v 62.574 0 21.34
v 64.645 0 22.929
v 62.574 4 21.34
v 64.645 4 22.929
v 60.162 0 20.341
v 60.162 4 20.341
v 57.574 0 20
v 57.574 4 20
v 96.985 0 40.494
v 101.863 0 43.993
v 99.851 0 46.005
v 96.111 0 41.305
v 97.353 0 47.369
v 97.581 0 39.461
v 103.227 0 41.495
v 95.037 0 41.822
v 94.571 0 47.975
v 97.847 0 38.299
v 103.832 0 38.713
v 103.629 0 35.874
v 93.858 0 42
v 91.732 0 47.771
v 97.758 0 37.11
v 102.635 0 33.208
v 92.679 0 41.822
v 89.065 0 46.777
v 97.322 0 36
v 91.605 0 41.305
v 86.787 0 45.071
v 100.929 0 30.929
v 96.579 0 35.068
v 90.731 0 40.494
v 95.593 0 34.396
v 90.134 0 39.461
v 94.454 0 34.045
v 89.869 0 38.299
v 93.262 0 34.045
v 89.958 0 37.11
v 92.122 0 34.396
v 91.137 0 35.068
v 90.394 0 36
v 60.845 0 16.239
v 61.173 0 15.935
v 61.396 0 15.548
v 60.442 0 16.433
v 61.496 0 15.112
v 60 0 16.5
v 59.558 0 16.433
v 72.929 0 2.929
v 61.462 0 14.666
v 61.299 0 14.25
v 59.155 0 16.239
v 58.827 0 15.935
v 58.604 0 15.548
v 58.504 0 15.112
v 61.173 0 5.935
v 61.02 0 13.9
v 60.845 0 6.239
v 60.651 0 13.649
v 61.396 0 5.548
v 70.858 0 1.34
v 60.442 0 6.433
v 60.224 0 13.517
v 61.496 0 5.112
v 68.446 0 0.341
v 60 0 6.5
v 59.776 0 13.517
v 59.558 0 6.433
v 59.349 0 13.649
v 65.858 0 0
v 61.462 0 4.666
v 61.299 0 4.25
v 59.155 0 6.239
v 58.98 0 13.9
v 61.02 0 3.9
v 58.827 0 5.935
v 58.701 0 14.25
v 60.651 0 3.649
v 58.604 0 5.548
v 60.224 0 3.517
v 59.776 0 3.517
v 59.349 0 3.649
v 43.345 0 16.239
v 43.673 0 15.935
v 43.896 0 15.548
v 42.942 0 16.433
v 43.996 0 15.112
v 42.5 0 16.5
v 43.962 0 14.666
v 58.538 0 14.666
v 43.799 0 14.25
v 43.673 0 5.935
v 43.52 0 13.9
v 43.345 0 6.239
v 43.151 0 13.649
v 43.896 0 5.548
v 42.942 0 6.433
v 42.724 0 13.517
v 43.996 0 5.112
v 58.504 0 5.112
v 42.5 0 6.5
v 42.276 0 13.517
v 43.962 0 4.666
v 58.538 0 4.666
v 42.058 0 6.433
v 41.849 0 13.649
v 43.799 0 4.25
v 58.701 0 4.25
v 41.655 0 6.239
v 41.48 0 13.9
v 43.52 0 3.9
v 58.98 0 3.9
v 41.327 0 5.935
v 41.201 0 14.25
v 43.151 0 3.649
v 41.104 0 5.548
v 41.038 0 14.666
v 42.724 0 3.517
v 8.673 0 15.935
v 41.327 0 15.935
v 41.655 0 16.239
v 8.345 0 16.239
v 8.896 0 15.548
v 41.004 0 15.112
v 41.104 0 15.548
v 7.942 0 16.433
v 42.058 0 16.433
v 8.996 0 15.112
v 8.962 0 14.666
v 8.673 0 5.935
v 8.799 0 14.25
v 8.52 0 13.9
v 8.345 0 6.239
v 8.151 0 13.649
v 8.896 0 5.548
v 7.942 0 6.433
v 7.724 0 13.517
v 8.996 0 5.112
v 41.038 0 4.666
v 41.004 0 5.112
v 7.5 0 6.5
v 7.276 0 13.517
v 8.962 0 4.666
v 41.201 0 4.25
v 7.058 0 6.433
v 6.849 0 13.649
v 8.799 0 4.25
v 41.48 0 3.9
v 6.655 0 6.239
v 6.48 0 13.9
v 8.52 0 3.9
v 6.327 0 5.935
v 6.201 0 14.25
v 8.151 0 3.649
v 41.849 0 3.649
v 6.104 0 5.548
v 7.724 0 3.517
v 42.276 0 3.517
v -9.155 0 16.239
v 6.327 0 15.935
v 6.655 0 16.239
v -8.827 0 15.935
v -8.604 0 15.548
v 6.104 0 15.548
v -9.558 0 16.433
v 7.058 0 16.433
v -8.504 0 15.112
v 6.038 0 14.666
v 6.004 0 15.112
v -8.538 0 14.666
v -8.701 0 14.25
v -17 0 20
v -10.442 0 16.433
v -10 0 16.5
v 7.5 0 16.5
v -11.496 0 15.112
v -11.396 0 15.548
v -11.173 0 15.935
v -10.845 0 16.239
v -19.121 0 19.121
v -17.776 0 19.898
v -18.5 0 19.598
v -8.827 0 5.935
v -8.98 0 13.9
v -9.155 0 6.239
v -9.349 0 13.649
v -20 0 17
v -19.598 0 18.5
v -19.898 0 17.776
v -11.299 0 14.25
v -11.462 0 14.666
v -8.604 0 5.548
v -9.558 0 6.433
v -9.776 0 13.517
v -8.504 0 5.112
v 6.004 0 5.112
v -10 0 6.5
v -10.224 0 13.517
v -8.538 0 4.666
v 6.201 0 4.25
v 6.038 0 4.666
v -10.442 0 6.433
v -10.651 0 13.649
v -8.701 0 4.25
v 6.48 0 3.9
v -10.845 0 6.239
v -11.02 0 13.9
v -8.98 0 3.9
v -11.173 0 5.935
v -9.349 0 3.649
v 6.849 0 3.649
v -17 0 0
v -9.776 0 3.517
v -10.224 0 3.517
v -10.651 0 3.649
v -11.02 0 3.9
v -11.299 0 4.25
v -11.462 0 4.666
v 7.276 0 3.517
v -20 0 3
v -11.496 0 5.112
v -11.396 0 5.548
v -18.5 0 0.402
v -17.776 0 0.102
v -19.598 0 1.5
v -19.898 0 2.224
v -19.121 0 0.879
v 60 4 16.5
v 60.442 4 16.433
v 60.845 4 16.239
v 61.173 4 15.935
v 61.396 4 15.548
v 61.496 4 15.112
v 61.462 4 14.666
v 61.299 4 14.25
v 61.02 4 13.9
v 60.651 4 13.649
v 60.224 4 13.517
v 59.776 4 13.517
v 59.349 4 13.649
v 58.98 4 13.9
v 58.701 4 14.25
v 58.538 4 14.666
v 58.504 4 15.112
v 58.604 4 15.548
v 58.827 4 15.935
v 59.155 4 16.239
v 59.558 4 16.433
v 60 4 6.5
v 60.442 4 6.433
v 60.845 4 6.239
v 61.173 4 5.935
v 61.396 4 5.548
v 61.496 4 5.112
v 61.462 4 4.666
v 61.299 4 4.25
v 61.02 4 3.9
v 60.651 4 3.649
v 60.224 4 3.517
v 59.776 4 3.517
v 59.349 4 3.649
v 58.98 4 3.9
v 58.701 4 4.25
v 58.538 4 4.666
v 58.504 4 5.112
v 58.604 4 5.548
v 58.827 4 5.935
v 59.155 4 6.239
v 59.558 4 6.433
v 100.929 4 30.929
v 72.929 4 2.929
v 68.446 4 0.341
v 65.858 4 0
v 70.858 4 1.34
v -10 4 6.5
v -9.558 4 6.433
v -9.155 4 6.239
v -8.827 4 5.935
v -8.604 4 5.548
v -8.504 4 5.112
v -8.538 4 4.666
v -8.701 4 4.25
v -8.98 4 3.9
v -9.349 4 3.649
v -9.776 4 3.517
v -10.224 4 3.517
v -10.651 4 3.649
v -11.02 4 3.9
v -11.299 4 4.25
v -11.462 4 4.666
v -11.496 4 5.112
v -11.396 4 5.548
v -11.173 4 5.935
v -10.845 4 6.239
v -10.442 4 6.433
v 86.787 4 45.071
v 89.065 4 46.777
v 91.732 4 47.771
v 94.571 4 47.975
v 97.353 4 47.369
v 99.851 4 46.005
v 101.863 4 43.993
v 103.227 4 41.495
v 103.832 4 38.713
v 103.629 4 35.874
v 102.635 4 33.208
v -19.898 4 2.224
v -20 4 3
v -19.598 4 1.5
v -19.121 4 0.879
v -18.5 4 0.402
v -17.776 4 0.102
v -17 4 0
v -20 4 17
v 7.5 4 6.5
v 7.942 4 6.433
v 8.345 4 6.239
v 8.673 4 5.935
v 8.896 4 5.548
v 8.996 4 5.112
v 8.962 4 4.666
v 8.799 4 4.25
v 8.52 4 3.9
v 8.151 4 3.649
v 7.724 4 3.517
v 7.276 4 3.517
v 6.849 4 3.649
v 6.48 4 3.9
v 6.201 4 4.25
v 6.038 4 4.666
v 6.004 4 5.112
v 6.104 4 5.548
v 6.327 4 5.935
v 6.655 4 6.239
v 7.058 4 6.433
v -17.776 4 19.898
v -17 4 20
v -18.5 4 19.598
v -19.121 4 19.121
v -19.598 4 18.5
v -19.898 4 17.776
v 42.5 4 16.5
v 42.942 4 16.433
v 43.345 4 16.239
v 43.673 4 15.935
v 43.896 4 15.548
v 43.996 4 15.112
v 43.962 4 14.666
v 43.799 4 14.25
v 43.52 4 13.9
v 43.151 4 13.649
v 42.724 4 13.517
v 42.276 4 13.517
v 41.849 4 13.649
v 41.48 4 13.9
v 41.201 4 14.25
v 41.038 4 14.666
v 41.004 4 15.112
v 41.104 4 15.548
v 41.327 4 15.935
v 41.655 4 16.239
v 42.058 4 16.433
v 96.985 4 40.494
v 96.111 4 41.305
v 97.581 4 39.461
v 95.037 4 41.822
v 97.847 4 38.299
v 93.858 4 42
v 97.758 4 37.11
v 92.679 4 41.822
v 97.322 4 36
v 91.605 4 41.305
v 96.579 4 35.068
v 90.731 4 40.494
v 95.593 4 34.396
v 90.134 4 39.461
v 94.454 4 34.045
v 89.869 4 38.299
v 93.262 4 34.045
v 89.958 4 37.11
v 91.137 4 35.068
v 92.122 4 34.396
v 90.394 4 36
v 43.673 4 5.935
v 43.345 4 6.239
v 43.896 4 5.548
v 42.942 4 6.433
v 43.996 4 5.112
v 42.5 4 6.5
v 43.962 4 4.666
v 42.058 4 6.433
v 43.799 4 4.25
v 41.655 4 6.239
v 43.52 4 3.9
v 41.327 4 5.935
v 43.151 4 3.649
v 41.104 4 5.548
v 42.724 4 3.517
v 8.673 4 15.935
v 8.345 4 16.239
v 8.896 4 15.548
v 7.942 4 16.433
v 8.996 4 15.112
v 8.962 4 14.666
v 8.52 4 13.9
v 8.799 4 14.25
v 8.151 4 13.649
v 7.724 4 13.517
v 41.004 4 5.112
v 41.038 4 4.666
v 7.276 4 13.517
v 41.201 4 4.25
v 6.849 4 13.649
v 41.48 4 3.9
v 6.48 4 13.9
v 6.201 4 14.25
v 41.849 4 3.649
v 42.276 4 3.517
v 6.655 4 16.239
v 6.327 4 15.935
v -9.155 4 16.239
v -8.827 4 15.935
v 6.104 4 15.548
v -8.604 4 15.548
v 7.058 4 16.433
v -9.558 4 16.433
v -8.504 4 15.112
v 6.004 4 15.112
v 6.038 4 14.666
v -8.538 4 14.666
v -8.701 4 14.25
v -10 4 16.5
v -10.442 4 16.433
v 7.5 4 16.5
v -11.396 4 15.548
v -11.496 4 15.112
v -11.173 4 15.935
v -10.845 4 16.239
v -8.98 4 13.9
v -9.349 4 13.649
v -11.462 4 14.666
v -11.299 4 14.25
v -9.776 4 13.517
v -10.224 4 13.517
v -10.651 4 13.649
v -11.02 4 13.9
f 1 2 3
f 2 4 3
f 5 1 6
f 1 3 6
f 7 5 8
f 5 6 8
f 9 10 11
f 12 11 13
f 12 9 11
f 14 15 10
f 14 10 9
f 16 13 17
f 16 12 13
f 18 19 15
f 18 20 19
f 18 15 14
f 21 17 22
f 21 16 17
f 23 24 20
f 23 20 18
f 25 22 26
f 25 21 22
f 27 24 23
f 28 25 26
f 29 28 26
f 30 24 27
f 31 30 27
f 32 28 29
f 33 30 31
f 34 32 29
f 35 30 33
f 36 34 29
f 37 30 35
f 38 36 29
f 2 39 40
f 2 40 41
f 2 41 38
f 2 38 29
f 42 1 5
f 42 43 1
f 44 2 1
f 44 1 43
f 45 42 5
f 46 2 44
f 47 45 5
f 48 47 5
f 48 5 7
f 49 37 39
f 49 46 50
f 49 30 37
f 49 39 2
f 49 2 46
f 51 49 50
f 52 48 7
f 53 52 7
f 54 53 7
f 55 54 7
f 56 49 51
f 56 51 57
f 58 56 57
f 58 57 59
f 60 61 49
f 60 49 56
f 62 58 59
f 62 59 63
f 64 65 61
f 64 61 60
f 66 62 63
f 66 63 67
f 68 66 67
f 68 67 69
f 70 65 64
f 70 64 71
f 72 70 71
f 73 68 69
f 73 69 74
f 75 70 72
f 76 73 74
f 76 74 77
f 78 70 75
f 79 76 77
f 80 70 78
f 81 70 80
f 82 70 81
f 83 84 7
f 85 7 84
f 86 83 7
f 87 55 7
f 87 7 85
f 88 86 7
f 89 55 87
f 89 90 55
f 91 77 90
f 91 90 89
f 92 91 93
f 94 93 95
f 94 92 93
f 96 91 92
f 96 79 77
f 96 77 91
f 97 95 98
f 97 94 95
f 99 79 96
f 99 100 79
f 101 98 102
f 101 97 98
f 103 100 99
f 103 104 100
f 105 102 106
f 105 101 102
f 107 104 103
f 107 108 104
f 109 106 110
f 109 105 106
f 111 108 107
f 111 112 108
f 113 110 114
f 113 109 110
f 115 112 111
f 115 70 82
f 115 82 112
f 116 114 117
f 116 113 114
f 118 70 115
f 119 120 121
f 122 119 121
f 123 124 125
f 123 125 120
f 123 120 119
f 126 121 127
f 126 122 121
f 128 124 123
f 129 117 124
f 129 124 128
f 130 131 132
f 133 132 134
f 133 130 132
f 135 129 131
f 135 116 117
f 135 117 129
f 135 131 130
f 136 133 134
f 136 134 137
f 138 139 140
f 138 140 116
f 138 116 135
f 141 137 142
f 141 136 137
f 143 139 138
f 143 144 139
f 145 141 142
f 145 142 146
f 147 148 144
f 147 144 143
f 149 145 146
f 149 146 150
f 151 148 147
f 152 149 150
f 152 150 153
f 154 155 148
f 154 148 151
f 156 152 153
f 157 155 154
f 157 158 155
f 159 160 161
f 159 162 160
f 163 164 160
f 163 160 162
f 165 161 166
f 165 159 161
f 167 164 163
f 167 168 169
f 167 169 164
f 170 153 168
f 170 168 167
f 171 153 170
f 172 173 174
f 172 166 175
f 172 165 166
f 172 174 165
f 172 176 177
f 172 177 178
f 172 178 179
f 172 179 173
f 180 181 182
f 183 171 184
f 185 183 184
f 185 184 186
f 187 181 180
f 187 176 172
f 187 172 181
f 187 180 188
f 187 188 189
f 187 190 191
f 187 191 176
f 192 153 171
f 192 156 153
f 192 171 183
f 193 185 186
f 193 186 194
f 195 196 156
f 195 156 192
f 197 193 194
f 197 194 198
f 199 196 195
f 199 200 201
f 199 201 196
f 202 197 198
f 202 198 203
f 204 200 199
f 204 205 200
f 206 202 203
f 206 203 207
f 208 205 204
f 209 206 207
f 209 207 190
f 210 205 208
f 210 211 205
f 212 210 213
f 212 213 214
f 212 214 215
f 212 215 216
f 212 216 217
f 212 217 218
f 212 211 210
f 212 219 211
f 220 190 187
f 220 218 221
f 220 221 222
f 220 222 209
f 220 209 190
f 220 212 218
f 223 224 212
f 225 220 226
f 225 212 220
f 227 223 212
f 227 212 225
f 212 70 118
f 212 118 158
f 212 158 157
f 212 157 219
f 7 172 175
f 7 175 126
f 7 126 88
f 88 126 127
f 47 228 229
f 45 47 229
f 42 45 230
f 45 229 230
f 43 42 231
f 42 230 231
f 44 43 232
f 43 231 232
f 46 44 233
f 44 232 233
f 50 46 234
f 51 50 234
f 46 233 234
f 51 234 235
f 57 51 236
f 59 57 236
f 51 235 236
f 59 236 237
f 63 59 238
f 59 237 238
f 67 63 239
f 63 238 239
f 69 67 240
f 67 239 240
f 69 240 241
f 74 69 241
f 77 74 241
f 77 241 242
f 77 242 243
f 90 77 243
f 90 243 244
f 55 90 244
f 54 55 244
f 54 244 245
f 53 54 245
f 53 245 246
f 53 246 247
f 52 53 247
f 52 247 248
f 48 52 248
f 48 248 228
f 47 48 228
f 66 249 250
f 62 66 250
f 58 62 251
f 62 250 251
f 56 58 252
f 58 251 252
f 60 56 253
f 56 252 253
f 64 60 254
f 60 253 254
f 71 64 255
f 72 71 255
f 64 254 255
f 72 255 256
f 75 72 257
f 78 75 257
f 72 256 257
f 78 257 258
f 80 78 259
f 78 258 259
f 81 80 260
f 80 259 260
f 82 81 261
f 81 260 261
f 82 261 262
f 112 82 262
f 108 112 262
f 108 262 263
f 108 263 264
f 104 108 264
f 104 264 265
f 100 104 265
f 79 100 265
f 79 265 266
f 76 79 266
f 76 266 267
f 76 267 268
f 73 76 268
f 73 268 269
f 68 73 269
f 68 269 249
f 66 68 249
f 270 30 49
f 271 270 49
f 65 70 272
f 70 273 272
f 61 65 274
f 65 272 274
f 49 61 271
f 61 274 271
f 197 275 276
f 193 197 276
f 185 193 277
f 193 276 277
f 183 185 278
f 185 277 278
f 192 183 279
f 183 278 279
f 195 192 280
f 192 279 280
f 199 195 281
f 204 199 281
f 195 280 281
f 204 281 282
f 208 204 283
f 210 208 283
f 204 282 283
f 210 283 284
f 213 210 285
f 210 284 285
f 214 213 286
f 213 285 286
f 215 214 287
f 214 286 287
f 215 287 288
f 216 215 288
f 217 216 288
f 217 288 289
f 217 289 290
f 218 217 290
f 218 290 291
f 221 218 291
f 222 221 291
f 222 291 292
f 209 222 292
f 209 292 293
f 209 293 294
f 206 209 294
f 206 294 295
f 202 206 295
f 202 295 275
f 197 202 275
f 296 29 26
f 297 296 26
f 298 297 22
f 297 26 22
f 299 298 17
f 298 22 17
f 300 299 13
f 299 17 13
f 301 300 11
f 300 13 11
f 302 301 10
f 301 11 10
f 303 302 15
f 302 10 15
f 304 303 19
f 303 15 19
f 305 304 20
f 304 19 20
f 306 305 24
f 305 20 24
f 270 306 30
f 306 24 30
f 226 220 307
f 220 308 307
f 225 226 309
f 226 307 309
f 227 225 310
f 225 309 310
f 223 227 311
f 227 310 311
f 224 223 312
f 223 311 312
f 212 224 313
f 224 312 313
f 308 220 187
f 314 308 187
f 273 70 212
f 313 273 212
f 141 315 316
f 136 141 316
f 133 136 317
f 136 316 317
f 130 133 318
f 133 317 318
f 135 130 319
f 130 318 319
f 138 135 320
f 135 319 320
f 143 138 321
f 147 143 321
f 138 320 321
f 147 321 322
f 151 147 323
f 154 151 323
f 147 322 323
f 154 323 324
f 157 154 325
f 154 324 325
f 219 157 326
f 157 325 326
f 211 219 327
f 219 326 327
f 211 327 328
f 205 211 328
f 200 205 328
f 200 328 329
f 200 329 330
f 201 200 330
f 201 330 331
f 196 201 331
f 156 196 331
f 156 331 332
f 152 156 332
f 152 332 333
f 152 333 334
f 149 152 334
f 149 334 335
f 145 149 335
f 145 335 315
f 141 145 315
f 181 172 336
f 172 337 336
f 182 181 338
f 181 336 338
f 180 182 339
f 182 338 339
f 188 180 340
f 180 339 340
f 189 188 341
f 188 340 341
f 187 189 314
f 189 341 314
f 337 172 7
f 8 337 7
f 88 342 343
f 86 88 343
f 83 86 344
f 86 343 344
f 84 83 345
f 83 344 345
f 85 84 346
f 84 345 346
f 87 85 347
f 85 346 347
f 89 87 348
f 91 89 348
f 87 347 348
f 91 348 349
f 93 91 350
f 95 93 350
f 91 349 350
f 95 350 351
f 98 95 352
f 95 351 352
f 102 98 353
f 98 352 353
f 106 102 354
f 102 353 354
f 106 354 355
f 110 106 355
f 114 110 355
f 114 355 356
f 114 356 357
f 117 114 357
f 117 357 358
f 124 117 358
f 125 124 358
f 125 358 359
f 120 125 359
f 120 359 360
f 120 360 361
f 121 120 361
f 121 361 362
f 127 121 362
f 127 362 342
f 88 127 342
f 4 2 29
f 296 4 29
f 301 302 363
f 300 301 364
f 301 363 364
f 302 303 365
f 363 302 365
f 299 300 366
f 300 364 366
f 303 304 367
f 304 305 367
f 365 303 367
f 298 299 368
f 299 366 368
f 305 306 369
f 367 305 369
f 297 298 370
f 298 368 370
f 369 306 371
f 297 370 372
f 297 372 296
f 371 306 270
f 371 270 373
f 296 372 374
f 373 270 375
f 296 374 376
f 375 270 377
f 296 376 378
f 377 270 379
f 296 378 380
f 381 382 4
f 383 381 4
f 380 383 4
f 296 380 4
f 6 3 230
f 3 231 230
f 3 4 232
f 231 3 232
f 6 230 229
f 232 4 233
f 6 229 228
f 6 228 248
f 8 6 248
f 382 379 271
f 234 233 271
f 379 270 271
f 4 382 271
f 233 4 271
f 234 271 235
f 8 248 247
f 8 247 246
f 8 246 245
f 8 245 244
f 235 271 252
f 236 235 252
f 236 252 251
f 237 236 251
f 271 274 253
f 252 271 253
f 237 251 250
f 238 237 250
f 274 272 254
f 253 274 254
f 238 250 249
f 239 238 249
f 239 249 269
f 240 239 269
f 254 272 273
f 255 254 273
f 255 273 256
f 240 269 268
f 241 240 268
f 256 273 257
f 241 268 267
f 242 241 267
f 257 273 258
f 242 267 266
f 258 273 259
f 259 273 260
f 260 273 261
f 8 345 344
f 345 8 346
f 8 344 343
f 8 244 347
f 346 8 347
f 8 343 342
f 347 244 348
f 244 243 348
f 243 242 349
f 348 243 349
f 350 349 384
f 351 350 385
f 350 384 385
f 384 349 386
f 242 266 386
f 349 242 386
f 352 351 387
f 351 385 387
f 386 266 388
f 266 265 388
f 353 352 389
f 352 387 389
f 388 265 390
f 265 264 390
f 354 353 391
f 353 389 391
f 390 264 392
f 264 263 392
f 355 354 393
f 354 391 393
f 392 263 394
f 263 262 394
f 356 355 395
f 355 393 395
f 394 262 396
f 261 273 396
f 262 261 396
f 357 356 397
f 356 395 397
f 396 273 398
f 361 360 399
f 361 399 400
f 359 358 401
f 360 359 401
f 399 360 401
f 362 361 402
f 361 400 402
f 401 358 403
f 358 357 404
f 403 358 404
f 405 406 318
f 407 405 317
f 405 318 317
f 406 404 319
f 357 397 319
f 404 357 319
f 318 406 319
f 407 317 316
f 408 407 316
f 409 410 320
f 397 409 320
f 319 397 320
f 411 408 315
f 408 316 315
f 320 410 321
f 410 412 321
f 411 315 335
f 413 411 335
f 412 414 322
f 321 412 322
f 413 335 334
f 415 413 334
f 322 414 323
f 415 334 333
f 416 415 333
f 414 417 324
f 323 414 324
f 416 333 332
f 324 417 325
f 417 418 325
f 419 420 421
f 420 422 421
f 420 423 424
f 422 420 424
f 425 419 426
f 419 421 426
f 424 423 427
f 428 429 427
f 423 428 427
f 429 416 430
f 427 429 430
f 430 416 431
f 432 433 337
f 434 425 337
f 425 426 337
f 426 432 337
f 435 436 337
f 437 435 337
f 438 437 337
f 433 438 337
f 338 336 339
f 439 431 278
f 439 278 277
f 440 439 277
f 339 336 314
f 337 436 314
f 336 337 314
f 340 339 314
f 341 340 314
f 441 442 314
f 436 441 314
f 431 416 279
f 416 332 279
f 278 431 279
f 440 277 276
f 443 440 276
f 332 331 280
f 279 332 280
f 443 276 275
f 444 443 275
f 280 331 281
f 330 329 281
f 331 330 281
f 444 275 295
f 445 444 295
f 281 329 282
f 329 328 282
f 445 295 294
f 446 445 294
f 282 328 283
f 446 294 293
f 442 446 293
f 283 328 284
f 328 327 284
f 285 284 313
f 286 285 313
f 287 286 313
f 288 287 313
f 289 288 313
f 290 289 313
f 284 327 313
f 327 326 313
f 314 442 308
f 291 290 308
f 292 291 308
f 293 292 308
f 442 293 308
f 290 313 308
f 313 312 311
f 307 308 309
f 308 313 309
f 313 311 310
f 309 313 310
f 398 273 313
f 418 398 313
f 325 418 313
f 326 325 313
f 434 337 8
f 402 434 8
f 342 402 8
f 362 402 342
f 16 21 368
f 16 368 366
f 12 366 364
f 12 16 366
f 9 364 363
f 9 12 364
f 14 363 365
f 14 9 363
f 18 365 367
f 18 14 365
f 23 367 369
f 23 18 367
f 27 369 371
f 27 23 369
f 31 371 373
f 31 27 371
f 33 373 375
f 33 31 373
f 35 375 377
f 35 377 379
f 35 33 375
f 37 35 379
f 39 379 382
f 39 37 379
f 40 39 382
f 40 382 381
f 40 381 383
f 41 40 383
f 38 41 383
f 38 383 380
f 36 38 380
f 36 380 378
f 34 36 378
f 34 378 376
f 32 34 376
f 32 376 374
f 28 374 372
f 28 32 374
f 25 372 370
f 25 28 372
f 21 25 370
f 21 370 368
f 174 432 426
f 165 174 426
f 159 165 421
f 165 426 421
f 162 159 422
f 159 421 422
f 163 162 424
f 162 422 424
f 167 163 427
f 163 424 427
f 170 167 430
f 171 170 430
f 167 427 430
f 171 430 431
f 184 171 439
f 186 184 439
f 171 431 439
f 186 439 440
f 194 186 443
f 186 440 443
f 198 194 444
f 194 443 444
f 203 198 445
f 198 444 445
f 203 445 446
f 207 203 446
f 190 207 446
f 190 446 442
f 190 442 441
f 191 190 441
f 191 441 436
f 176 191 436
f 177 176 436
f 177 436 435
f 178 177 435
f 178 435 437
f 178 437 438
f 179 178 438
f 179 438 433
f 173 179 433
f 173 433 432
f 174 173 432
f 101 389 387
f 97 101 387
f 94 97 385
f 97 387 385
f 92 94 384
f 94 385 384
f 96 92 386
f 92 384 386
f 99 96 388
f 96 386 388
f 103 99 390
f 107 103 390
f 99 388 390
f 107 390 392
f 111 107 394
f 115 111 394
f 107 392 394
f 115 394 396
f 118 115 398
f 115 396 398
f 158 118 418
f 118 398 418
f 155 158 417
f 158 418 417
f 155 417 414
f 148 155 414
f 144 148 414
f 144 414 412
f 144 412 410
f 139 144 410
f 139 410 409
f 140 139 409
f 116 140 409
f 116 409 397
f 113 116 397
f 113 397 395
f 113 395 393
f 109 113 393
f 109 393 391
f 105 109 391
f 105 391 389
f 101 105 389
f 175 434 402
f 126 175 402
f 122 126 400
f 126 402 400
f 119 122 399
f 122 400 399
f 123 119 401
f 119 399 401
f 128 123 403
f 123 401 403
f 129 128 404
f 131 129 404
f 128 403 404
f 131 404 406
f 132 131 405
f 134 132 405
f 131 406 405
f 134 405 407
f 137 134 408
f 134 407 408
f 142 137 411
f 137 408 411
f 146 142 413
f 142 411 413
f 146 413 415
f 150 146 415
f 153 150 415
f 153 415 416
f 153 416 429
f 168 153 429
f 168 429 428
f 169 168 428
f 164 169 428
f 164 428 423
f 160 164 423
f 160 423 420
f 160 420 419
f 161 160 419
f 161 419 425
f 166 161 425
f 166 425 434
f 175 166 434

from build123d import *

# Parameters (mm, degrees)
SKETCH_1_R          = 4
EXTRUDE_1_DEPTH     = 4
CUT_EXTRUDE_1_REACH = 127.309
SKETCH_2_R          = 1.5
EXTRUDE_2_DEPTH     = 4
FILLET_1_R          = 3
FILLET_3_R          = 10
SKETCH_4_R          = 1.5
CUT_EXTRUDE_2_DEPTH = 10


with BuildPart() as part:
    # 草图1 → 凸台-拉伸1 (new body)
    with BuildSketch(Plane(origin=(0, 0, 0), x_dir=(1, 0, 0), z_dir=(0, 1, 0))):
        with BuildLine():
            Line((100.928932188, -30.928932188), (70, 0))
            Line((70, 0), (35, 0))
            Line((35, 0), (35, 70))
            Line((35, 70), (15, 70))
            Line((15, 70), (15, 0))
            Line((15, 0), (-20, 0))
            Line((-20, 0), (-20, -20))
            Line((-20, -20), (61.715728753, -20))
            Line((61.715728753, -20), (86.786796564, -45.071067812))
            ThreePointArc((86.786796564, -45.071067812), (100.928932188, -45.071067812), (100.928932188, -30.928932188))
        make_face()
        with Locations(Location((93.857864376, -38, 0), (0, 0, 270))):
            Circle(SKETCH_1_R, mode=Mode.SUBTRACT)
    extrude(amount=EXTRUDE_1_DEPTH)

    # 草图2 → 切除-拉伸1 (cut, up to next)
    with BuildSketch(Plane(origin=(0, 4, 0), x_dir=(1, 0, 0), z_dir=(0, 1, 0)), mode=Mode.PRIVATE) as cut_extrude_1_sk1:
        with Locations(Location((17.5, 60, 0), (0, 0, 270))):
            Circle(SKETCH_2_R)
    cut_extrude_1_tool1 = extrude(cut_extrude_1_sk1.sketch, amount=-CUT_EXTRUDE_1_REACH, mode=Mode.PRIVATE) & part.part
    # 草图2 → 切除-拉伸1 (cut, up to next)
    with BuildSketch(Plane(origin=(0, 4, 0), x_dir=(1, 0, 0), z_dir=(0, 1, 0)), mode=Mode.PRIVATE) as cut_extrude_1_sk2:
        with Locations(Location((32.5, 60, 0), (0, 0, 270))):
            Circle(SKETCH_2_R)
    cut_extrude_1_tool2 = extrude(cut_extrude_1_sk2.sketch, amount=-CUT_EXTRUDE_1_REACH, mode=Mode.PRIVATE) & part.part
    # 草图2 → 切除-拉伸1 (cut, up to next)
    with BuildSketch(Plane(origin=(0, 4, 0), x_dir=(1, 0, 0), z_dir=(0, 1, 0)), mode=Mode.PRIVATE) as cut_extrude_1_sk3:
        with Locations(Location((32.5, 50, 0), (0, 0, 270))):
            Circle(SKETCH_2_R)
    cut_extrude_1_tool3 = extrude(cut_extrude_1_sk3.sketch, amount=-CUT_EXTRUDE_1_REACH, mode=Mode.PRIVATE) & part.part
    # 草图2 → 切除-拉伸1 (cut, up to next)
    with BuildSketch(Plane(origin=(0, 4, 0), x_dir=(1, 0, 0), z_dir=(0, 1, 0)), mode=Mode.PRIVATE) as cut_extrude_1_sk4:
        with Locations(Location((17.5, 50, 0), (0, 0, 270))):
            Circle(SKETCH_2_R)
    cut_extrude_1_tool4 = extrude(cut_extrude_1_sk4.sketch, amount=-CUT_EXTRUDE_1_REACH, mode=Mode.PRIVATE) & part.part
    # 草图2 → 切除-拉伸1 (cut, up to next)
    with BuildSketch(Plane(origin=(0, 4, 0), x_dir=(1, 0, 0), z_dir=(0, 1, 0)), mode=Mode.PRIVATE) as cut_extrude_1_sk5:
        with Locations(Location((17.5, 20, 0), (0, 0, 270))):
            Circle(SKETCH_2_R)
    cut_extrude_1_tool5 = extrude(cut_extrude_1_sk5.sketch, amount=-CUT_EXTRUDE_1_REACH, mode=Mode.PRIVATE) & part.part
    # 草图2 → 切除-拉伸1 (cut, up to next)
    with BuildSketch(Plane(origin=(0, 4, 0), x_dir=(1, 0, 0), z_dir=(0, 1, 0)), mode=Mode.PRIVATE) as cut_extrude_1_sk6:
        with Locations(Location((17.5, 10, 0), (0, 0, 270))):
            Circle(SKETCH_2_R)
    cut_extrude_1_tool6 = extrude(cut_extrude_1_sk6.sketch, amount=-CUT_EXTRUDE_1_REACH, mode=Mode.PRIVATE) & part.part
    # 草图2 → 切除-拉伸1 (cut, up to next)
    with BuildSketch(Plane(origin=(0, 4, 0), x_dir=(1, 0, 0), z_dir=(0, 1, 0)), mode=Mode.PRIVATE) as cut_extrude_1_sk7:
        with Locations(Location((32.5, 10, 0), (0, 0, 270))):
            Circle(SKETCH_2_R)
    cut_extrude_1_tool7 = extrude(cut_extrude_1_sk7.sketch, amount=-CUT_EXTRUDE_1_REACH, mode=Mode.PRIVATE) & part.part
    # 草图2 → 切除-拉伸1 (cut, up to next)
    with BuildSketch(Plane(origin=(0, 4, 0), x_dir=(1, 0, 0), z_dir=(0, 1, 0)), mode=Mode.PRIVATE) as cut_extrude_1_sk8:
        with Locations(Location((32.5, 20, 0), (0, 0, 270))):
            Circle(SKETCH_2_R)
    cut_extrude_1_tool8 = extrude(cut_extrude_1_sk8.sketch, amount=-CUT_EXTRUDE_1_REACH, mode=Mode.PRIVATE) & part.part
    # 草图2 → 切除-拉伸1 (cut, up to next)
    with BuildSketch(Plane(origin=(0, 4, 0), x_dir=(1, 0, 0), z_dir=(0, 1, 0)), mode=Mode.PRIVATE) as cut_extrude_1_sk9:
        with Locations(Location((42.5, -5, 0), (0, 0, 270))):
            Circle(SKETCH_2_R)
    cut_extrude_1_tool9 = extrude(cut_extrude_1_sk9.sketch, amount=-CUT_EXTRUDE_1_REACH, mode=Mode.PRIVATE) & part.part
    # 草图2 → 切除-拉伸1 (cut, up to next)
    with BuildSketch(Plane(origin=(0, 4, 0), x_dir=(1, 0, 0), z_dir=(0, 1, 0)), mode=Mode.PRIVATE) as cut_extrude_1_sk10:
        with Locations(Location((42.5, -15, 0), (0, 0, 270))):
            Circle(SKETCH_2_R)
    cut_extrude_1_tool10 = extrude(cut_extrude_1_sk10.sketch, amount=-CUT_EXTRUDE_1_REACH, mode=Mode.PRIVATE) & part.part
    # 草图2 → 切除-拉伸1 (cut, up to next)
    with BuildSketch(Plane(origin=(0, 4, 0), x_dir=(1, 0, 0), z_dir=(0, 1, 0)), mode=Mode.PRIVATE) as cut_extrude_1_sk11:
        with Locations(Location((7.5, -15, 0), (0, 0, 270))):
            Circle(SKETCH_2_R)
    cut_extrude_1_tool11 = extrude(cut_extrude_1_sk11.sketch, amount=-CUT_EXTRUDE_1_REACH, mode=Mode.PRIVATE) & part.part
    # 草图2 → 切除-拉伸1 (cut, up to next)
    with BuildSketch(Plane(origin=(0, 4, 0), x_dir=(1, 0, 0), z_dir=(0, 1, 0)), mode=Mode.PRIVATE) as cut_extrude_1_sk12:
        with Locations(Location((7.5, -5, 0), (0, 0, 270))):
            Circle(SKETCH_2_R)
    cut_extrude_1_tool12 = extrude(cut_extrude_1_sk12.sketch, amount=-CUT_EXTRUDE_1_REACH, mode=Mode.PRIVATE) & part.part
    # 草图2 → 切除-拉伸1 (cut, up to next)
    with BuildSketch(Plane(origin=(0, 4, 0), x_dir=(1, 0, 0), z_dir=(0, 1, 0)), mode=Mode.PRIVATE) as cut_extrude_1_sk13:
        with Locations(Location((60, -15, 0), (0, 0, 270))):
            Circle(SKETCH_2_R)
    cut_extrude_1_tool13 = extrude(cut_extrude_1_sk13.sketch, amount=-CUT_EXTRUDE_1_REACH, mode=Mode.PRIVATE) & part.part
    # 草图2 → 切除-拉伸1 (cut, up to next)
    with BuildSketch(Plane(origin=(0, 4, 0), x_dir=(1, 0, 0), z_dir=(0, 1, 0)), mode=Mode.PRIVATE) as cut_extrude_1_sk14:
        with Locations(Location((60, -5, 0), (0, 0, 270))):
            Circle(SKETCH_2_R)
    cut_extrude_1_tool14 = extrude(cut_extrude_1_sk14.sketch, amount=-CUT_EXTRUDE_1_REACH, mode=Mode.PRIVATE) & part.part
    # 草图2 → 切除-拉伸1 (cut, up to next)
    with BuildSketch(Plane(origin=(0, 4, 0), x_dir=(1, 0, 0), z_dir=(0, 1, 0)), mode=Mode.PRIVATE) as cut_extrude_1_sk15:
        with Locations(Location((-10, -15, 0), (0, 0, 270))):
            Circle(SKETCH_2_R)
    cut_extrude_1_tool15 = extrude(cut_extrude_1_sk15.sketch, amount=-CUT_EXTRUDE_1_REACH, mode=Mode.PRIVATE) & part.part
    # 草图2 → 切除-拉伸1 (cut, up to next)
    with BuildSketch(Plane(origin=(0, 4, 0), x_dir=(1, 0, 0), z_dir=(0, 1, 0)), mode=Mode.PRIVATE) as cut_extrude_1_sk16:
        with Locations(Location((-10, -5, 0), (0, 0, 270))):
            Circle(SKETCH_2_R)
    cut_extrude_1_tool16 = extrude(cut_extrude_1_sk16.sketch, amount=-CUT_EXTRUDE_1_REACH, mode=Mode.PRIVATE) & part.part
    add(cut_extrude_1_tool1.solids().sort_by_distance((17.5, 4, -60))[0], mode=Mode.SUBTRACT)
    add(cut_extrude_1_tool2.solids().sort_by_distance((32.5, 4, -60))[0], mode=Mode.SUBTRACT)
    add(cut_extrude_1_tool3.solids().sort_by_distance((32.5, 4, -50))[0], mode=Mode.SUBTRACT)
    add(cut_extrude_1_tool4.solids().sort_by_distance((17.5, 4, -50))[0], mode=Mode.SUBTRACT)
    add(cut_extrude_1_tool5.solids().sort_by_distance((17.5, 4, -20))[0], mode=Mode.SUBTRACT)
    add(cut_extrude_1_tool6.solids().sort_by_distance((17.5, 4, -10))[0], mode=Mode.SUBTRACT)
    add(cut_extrude_1_tool7.solids().sort_by_distance((32.5, 4, -10))[0], mode=Mode.SUBTRACT)
    add(cut_extrude_1_tool8.solids().sort_by_distance((32.5, 4, -20))[0], mode=Mode.SUBTRACT)
    add(cut_extrude_1_tool9.solids().sort_by_distance((42.5, 4, 5))[0], mode=Mode.SUBTRACT)
    add(cut_extrude_1_tool10.solids().sort_by_distance((42.5, 4, 15))[0], mode=Mode.SUBTRACT)
    add(cut_extrude_1_tool11.solids().sort_by_distance((7.5, 4, 15))[0], mode=Mode.SUBTRACT)
    add(cut_extrude_1_tool12.solids().sort_by_distance((7.5, 4, 5))[0], mode=Mode.SUBTRACT)
    add(cut_extrude_1_tool13.solids().sort_by_distance((60, 4, 15))[0], mode=Mode.SUBTRACT)
    add(cut_extrude_1_tool14.solids().sort_by_distance((60, 4, 5))[0], mode=Mode.SUBTRACT)
    add(cut_extrude_1_tool15.solids().sort_by_distance((-10, 4, 15))[0], mode=Mode.SUBTRACT)
    add(cut_extrude_1_tool16.solids().sort_by_distance((-10, 4, 5))[0], mode=Mode.SUBTRACT)

    # 草图3 → 凸台-拉伸2 (add)
    with BuildSketch(Plane(origin=(0, 4, 0), x_dir=(1, 0, 0), z_dir=(0, 1, 0))):
        Polygon((50, 0), (35, 0), (35, 20), align=None)
        Polygon((15, 0), (0, 0), (15, 20), align=None)
    extrude(amount=-EXTRUDE_2_DEPTH)

    # 圆角1
    fillet_1_edges = [part.edges().sort_by_distance(p)[0] for p in [
        (35, 2, -20),
        (50, 2, 0),
        (15, 2, -20),
        (0, 2, 0),
        (-20, 2, 20),
        (-20, 2, 0),
        (15, 2, -70),
        (35, 2, -70),
    ]]
    fillet(fillet_1_edges, radius=FILLET_1_R)

    # 圆角3
    fillet_3_edges = [part.edges().sort_by_distance(p)[0] for p in [
        (61.715728753, 2, 20),
        (70, 2, 0),
    ]]
    fillet(fillet_3_edges, radius=FILLET_3_R)

    # 草图4 → 切除-拉伸2 (cut)
    with BuildSketch(Plane(origin=(0, 4, 0), x_dir=(1, 0, 0), z_dir=(0, 1, 0))):
        with BuildLine():
            Line((-1.5, 0), (51.5, 0))
            ThreePointArc((51.5, 0), (50.158359214, 0.316718427), (49.1, 1.2))
            Line((49.1, 1.2), (35.6, 19.2))
            ThreePointArc((35.6, 19.2), (35.153950106, 20.051316702), (35, 21))
            Line((35, 21), (35, 67))
            ThreePointArc((35, 67), (34.121320344, 69.121320344), (32, 70))
            Line((32, 70), (18, 70))
            ThreePointArc((18, 70), (15.878679656, 69.121320344), (15, 67))
            Line((15, 67), (15, 21))
            ThreePointArc((15, 21), (14.846049894, 20.051316702), (14.4, 19.2))
            Line((14.4, 19.2), (0.9, 1.2))
            ThreePointArc((0.9, 1.2), (-0.158359214, 0.316718427), (-1.5, 0))
        make_face()
        with Locations((32.5, 10)):
            Circle(SKETCH_4_R, mode=Mode.SUBTRACT)
        with Locations((17.5, 20)):
            Circle(SKETCH_4_R, mode=Mode.SUBTRACT)
        with Locations((32.5, 60)):
            Circle(SKETCH_4_R, mode=Mode.SUBTRACT)
        with Locations((17.5, 50)):
            Circle(SKETCH_4_R, mode=Mode.SUBTRACT)
        with Locations((17.5, 60)):
            Circle(SKETCH_4_R, mode=Mode.SUBTRACT)
        with Locations((32.5, 50)):
            Circle(SKETCH_4_R, mode=Mode.SUBTRACT)
        with Locations((32.5, 20)):
            Circle(SKETCH_4_R, mode=Mode.SUBTRACT)
        with Locations((17.5, 10)):
            Circle(SKETCH_4_R, mode=Mode.SUBTRACT)
    extrude(amount=-CUT_EXTRUDE_2_DEPTH, mode=Mode.SUBTRACT)


solid = part.part
